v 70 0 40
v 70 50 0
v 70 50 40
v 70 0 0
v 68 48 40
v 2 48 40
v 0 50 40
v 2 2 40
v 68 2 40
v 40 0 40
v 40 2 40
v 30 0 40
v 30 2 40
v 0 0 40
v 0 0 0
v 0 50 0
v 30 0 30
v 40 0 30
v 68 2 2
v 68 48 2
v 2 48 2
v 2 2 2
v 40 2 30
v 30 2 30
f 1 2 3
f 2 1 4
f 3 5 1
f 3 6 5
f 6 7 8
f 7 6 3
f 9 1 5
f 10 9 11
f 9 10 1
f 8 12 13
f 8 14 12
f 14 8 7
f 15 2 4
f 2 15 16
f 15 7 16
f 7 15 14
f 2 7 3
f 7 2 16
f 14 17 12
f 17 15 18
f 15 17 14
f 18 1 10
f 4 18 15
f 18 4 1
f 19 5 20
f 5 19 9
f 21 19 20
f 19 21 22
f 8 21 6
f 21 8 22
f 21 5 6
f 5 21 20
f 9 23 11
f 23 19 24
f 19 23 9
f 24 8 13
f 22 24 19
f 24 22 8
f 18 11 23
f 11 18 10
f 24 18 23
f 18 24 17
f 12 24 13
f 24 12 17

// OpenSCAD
$fn = 32;

// ----------------------------------------------------------------------
// Enclosure box: notch enclosure
// ----------------------------------------------------------------------

// --- parameters (mm) ---
box_l = 70;               // outer length, X
box_w = 50;               // outer width, Y
box_h = 40;               // outer height
wall_t = 2;               // wall thickness
notch_w = 10;             // cable notch width
notch_h = 10;             // cable notch height

inner_h = box_h - wall_t;  // cavity depth
boss_h = inner_h - 2;  // corner boss height

difference() {
  union() {
    difference() {
      cube([box_l, box_w, box_h]);
      translate([wall_t, wall_t, wall_t])
        cube([box_l - 2 * wall_t, box_w - 2 * wall_t, box_h]);
    }
  }
  translate([box_l / 2 - notch_w / 2, -1, box_h - notch_h])
    cube([notch_w, wall_t + 2, notch_h + 1]);
}
